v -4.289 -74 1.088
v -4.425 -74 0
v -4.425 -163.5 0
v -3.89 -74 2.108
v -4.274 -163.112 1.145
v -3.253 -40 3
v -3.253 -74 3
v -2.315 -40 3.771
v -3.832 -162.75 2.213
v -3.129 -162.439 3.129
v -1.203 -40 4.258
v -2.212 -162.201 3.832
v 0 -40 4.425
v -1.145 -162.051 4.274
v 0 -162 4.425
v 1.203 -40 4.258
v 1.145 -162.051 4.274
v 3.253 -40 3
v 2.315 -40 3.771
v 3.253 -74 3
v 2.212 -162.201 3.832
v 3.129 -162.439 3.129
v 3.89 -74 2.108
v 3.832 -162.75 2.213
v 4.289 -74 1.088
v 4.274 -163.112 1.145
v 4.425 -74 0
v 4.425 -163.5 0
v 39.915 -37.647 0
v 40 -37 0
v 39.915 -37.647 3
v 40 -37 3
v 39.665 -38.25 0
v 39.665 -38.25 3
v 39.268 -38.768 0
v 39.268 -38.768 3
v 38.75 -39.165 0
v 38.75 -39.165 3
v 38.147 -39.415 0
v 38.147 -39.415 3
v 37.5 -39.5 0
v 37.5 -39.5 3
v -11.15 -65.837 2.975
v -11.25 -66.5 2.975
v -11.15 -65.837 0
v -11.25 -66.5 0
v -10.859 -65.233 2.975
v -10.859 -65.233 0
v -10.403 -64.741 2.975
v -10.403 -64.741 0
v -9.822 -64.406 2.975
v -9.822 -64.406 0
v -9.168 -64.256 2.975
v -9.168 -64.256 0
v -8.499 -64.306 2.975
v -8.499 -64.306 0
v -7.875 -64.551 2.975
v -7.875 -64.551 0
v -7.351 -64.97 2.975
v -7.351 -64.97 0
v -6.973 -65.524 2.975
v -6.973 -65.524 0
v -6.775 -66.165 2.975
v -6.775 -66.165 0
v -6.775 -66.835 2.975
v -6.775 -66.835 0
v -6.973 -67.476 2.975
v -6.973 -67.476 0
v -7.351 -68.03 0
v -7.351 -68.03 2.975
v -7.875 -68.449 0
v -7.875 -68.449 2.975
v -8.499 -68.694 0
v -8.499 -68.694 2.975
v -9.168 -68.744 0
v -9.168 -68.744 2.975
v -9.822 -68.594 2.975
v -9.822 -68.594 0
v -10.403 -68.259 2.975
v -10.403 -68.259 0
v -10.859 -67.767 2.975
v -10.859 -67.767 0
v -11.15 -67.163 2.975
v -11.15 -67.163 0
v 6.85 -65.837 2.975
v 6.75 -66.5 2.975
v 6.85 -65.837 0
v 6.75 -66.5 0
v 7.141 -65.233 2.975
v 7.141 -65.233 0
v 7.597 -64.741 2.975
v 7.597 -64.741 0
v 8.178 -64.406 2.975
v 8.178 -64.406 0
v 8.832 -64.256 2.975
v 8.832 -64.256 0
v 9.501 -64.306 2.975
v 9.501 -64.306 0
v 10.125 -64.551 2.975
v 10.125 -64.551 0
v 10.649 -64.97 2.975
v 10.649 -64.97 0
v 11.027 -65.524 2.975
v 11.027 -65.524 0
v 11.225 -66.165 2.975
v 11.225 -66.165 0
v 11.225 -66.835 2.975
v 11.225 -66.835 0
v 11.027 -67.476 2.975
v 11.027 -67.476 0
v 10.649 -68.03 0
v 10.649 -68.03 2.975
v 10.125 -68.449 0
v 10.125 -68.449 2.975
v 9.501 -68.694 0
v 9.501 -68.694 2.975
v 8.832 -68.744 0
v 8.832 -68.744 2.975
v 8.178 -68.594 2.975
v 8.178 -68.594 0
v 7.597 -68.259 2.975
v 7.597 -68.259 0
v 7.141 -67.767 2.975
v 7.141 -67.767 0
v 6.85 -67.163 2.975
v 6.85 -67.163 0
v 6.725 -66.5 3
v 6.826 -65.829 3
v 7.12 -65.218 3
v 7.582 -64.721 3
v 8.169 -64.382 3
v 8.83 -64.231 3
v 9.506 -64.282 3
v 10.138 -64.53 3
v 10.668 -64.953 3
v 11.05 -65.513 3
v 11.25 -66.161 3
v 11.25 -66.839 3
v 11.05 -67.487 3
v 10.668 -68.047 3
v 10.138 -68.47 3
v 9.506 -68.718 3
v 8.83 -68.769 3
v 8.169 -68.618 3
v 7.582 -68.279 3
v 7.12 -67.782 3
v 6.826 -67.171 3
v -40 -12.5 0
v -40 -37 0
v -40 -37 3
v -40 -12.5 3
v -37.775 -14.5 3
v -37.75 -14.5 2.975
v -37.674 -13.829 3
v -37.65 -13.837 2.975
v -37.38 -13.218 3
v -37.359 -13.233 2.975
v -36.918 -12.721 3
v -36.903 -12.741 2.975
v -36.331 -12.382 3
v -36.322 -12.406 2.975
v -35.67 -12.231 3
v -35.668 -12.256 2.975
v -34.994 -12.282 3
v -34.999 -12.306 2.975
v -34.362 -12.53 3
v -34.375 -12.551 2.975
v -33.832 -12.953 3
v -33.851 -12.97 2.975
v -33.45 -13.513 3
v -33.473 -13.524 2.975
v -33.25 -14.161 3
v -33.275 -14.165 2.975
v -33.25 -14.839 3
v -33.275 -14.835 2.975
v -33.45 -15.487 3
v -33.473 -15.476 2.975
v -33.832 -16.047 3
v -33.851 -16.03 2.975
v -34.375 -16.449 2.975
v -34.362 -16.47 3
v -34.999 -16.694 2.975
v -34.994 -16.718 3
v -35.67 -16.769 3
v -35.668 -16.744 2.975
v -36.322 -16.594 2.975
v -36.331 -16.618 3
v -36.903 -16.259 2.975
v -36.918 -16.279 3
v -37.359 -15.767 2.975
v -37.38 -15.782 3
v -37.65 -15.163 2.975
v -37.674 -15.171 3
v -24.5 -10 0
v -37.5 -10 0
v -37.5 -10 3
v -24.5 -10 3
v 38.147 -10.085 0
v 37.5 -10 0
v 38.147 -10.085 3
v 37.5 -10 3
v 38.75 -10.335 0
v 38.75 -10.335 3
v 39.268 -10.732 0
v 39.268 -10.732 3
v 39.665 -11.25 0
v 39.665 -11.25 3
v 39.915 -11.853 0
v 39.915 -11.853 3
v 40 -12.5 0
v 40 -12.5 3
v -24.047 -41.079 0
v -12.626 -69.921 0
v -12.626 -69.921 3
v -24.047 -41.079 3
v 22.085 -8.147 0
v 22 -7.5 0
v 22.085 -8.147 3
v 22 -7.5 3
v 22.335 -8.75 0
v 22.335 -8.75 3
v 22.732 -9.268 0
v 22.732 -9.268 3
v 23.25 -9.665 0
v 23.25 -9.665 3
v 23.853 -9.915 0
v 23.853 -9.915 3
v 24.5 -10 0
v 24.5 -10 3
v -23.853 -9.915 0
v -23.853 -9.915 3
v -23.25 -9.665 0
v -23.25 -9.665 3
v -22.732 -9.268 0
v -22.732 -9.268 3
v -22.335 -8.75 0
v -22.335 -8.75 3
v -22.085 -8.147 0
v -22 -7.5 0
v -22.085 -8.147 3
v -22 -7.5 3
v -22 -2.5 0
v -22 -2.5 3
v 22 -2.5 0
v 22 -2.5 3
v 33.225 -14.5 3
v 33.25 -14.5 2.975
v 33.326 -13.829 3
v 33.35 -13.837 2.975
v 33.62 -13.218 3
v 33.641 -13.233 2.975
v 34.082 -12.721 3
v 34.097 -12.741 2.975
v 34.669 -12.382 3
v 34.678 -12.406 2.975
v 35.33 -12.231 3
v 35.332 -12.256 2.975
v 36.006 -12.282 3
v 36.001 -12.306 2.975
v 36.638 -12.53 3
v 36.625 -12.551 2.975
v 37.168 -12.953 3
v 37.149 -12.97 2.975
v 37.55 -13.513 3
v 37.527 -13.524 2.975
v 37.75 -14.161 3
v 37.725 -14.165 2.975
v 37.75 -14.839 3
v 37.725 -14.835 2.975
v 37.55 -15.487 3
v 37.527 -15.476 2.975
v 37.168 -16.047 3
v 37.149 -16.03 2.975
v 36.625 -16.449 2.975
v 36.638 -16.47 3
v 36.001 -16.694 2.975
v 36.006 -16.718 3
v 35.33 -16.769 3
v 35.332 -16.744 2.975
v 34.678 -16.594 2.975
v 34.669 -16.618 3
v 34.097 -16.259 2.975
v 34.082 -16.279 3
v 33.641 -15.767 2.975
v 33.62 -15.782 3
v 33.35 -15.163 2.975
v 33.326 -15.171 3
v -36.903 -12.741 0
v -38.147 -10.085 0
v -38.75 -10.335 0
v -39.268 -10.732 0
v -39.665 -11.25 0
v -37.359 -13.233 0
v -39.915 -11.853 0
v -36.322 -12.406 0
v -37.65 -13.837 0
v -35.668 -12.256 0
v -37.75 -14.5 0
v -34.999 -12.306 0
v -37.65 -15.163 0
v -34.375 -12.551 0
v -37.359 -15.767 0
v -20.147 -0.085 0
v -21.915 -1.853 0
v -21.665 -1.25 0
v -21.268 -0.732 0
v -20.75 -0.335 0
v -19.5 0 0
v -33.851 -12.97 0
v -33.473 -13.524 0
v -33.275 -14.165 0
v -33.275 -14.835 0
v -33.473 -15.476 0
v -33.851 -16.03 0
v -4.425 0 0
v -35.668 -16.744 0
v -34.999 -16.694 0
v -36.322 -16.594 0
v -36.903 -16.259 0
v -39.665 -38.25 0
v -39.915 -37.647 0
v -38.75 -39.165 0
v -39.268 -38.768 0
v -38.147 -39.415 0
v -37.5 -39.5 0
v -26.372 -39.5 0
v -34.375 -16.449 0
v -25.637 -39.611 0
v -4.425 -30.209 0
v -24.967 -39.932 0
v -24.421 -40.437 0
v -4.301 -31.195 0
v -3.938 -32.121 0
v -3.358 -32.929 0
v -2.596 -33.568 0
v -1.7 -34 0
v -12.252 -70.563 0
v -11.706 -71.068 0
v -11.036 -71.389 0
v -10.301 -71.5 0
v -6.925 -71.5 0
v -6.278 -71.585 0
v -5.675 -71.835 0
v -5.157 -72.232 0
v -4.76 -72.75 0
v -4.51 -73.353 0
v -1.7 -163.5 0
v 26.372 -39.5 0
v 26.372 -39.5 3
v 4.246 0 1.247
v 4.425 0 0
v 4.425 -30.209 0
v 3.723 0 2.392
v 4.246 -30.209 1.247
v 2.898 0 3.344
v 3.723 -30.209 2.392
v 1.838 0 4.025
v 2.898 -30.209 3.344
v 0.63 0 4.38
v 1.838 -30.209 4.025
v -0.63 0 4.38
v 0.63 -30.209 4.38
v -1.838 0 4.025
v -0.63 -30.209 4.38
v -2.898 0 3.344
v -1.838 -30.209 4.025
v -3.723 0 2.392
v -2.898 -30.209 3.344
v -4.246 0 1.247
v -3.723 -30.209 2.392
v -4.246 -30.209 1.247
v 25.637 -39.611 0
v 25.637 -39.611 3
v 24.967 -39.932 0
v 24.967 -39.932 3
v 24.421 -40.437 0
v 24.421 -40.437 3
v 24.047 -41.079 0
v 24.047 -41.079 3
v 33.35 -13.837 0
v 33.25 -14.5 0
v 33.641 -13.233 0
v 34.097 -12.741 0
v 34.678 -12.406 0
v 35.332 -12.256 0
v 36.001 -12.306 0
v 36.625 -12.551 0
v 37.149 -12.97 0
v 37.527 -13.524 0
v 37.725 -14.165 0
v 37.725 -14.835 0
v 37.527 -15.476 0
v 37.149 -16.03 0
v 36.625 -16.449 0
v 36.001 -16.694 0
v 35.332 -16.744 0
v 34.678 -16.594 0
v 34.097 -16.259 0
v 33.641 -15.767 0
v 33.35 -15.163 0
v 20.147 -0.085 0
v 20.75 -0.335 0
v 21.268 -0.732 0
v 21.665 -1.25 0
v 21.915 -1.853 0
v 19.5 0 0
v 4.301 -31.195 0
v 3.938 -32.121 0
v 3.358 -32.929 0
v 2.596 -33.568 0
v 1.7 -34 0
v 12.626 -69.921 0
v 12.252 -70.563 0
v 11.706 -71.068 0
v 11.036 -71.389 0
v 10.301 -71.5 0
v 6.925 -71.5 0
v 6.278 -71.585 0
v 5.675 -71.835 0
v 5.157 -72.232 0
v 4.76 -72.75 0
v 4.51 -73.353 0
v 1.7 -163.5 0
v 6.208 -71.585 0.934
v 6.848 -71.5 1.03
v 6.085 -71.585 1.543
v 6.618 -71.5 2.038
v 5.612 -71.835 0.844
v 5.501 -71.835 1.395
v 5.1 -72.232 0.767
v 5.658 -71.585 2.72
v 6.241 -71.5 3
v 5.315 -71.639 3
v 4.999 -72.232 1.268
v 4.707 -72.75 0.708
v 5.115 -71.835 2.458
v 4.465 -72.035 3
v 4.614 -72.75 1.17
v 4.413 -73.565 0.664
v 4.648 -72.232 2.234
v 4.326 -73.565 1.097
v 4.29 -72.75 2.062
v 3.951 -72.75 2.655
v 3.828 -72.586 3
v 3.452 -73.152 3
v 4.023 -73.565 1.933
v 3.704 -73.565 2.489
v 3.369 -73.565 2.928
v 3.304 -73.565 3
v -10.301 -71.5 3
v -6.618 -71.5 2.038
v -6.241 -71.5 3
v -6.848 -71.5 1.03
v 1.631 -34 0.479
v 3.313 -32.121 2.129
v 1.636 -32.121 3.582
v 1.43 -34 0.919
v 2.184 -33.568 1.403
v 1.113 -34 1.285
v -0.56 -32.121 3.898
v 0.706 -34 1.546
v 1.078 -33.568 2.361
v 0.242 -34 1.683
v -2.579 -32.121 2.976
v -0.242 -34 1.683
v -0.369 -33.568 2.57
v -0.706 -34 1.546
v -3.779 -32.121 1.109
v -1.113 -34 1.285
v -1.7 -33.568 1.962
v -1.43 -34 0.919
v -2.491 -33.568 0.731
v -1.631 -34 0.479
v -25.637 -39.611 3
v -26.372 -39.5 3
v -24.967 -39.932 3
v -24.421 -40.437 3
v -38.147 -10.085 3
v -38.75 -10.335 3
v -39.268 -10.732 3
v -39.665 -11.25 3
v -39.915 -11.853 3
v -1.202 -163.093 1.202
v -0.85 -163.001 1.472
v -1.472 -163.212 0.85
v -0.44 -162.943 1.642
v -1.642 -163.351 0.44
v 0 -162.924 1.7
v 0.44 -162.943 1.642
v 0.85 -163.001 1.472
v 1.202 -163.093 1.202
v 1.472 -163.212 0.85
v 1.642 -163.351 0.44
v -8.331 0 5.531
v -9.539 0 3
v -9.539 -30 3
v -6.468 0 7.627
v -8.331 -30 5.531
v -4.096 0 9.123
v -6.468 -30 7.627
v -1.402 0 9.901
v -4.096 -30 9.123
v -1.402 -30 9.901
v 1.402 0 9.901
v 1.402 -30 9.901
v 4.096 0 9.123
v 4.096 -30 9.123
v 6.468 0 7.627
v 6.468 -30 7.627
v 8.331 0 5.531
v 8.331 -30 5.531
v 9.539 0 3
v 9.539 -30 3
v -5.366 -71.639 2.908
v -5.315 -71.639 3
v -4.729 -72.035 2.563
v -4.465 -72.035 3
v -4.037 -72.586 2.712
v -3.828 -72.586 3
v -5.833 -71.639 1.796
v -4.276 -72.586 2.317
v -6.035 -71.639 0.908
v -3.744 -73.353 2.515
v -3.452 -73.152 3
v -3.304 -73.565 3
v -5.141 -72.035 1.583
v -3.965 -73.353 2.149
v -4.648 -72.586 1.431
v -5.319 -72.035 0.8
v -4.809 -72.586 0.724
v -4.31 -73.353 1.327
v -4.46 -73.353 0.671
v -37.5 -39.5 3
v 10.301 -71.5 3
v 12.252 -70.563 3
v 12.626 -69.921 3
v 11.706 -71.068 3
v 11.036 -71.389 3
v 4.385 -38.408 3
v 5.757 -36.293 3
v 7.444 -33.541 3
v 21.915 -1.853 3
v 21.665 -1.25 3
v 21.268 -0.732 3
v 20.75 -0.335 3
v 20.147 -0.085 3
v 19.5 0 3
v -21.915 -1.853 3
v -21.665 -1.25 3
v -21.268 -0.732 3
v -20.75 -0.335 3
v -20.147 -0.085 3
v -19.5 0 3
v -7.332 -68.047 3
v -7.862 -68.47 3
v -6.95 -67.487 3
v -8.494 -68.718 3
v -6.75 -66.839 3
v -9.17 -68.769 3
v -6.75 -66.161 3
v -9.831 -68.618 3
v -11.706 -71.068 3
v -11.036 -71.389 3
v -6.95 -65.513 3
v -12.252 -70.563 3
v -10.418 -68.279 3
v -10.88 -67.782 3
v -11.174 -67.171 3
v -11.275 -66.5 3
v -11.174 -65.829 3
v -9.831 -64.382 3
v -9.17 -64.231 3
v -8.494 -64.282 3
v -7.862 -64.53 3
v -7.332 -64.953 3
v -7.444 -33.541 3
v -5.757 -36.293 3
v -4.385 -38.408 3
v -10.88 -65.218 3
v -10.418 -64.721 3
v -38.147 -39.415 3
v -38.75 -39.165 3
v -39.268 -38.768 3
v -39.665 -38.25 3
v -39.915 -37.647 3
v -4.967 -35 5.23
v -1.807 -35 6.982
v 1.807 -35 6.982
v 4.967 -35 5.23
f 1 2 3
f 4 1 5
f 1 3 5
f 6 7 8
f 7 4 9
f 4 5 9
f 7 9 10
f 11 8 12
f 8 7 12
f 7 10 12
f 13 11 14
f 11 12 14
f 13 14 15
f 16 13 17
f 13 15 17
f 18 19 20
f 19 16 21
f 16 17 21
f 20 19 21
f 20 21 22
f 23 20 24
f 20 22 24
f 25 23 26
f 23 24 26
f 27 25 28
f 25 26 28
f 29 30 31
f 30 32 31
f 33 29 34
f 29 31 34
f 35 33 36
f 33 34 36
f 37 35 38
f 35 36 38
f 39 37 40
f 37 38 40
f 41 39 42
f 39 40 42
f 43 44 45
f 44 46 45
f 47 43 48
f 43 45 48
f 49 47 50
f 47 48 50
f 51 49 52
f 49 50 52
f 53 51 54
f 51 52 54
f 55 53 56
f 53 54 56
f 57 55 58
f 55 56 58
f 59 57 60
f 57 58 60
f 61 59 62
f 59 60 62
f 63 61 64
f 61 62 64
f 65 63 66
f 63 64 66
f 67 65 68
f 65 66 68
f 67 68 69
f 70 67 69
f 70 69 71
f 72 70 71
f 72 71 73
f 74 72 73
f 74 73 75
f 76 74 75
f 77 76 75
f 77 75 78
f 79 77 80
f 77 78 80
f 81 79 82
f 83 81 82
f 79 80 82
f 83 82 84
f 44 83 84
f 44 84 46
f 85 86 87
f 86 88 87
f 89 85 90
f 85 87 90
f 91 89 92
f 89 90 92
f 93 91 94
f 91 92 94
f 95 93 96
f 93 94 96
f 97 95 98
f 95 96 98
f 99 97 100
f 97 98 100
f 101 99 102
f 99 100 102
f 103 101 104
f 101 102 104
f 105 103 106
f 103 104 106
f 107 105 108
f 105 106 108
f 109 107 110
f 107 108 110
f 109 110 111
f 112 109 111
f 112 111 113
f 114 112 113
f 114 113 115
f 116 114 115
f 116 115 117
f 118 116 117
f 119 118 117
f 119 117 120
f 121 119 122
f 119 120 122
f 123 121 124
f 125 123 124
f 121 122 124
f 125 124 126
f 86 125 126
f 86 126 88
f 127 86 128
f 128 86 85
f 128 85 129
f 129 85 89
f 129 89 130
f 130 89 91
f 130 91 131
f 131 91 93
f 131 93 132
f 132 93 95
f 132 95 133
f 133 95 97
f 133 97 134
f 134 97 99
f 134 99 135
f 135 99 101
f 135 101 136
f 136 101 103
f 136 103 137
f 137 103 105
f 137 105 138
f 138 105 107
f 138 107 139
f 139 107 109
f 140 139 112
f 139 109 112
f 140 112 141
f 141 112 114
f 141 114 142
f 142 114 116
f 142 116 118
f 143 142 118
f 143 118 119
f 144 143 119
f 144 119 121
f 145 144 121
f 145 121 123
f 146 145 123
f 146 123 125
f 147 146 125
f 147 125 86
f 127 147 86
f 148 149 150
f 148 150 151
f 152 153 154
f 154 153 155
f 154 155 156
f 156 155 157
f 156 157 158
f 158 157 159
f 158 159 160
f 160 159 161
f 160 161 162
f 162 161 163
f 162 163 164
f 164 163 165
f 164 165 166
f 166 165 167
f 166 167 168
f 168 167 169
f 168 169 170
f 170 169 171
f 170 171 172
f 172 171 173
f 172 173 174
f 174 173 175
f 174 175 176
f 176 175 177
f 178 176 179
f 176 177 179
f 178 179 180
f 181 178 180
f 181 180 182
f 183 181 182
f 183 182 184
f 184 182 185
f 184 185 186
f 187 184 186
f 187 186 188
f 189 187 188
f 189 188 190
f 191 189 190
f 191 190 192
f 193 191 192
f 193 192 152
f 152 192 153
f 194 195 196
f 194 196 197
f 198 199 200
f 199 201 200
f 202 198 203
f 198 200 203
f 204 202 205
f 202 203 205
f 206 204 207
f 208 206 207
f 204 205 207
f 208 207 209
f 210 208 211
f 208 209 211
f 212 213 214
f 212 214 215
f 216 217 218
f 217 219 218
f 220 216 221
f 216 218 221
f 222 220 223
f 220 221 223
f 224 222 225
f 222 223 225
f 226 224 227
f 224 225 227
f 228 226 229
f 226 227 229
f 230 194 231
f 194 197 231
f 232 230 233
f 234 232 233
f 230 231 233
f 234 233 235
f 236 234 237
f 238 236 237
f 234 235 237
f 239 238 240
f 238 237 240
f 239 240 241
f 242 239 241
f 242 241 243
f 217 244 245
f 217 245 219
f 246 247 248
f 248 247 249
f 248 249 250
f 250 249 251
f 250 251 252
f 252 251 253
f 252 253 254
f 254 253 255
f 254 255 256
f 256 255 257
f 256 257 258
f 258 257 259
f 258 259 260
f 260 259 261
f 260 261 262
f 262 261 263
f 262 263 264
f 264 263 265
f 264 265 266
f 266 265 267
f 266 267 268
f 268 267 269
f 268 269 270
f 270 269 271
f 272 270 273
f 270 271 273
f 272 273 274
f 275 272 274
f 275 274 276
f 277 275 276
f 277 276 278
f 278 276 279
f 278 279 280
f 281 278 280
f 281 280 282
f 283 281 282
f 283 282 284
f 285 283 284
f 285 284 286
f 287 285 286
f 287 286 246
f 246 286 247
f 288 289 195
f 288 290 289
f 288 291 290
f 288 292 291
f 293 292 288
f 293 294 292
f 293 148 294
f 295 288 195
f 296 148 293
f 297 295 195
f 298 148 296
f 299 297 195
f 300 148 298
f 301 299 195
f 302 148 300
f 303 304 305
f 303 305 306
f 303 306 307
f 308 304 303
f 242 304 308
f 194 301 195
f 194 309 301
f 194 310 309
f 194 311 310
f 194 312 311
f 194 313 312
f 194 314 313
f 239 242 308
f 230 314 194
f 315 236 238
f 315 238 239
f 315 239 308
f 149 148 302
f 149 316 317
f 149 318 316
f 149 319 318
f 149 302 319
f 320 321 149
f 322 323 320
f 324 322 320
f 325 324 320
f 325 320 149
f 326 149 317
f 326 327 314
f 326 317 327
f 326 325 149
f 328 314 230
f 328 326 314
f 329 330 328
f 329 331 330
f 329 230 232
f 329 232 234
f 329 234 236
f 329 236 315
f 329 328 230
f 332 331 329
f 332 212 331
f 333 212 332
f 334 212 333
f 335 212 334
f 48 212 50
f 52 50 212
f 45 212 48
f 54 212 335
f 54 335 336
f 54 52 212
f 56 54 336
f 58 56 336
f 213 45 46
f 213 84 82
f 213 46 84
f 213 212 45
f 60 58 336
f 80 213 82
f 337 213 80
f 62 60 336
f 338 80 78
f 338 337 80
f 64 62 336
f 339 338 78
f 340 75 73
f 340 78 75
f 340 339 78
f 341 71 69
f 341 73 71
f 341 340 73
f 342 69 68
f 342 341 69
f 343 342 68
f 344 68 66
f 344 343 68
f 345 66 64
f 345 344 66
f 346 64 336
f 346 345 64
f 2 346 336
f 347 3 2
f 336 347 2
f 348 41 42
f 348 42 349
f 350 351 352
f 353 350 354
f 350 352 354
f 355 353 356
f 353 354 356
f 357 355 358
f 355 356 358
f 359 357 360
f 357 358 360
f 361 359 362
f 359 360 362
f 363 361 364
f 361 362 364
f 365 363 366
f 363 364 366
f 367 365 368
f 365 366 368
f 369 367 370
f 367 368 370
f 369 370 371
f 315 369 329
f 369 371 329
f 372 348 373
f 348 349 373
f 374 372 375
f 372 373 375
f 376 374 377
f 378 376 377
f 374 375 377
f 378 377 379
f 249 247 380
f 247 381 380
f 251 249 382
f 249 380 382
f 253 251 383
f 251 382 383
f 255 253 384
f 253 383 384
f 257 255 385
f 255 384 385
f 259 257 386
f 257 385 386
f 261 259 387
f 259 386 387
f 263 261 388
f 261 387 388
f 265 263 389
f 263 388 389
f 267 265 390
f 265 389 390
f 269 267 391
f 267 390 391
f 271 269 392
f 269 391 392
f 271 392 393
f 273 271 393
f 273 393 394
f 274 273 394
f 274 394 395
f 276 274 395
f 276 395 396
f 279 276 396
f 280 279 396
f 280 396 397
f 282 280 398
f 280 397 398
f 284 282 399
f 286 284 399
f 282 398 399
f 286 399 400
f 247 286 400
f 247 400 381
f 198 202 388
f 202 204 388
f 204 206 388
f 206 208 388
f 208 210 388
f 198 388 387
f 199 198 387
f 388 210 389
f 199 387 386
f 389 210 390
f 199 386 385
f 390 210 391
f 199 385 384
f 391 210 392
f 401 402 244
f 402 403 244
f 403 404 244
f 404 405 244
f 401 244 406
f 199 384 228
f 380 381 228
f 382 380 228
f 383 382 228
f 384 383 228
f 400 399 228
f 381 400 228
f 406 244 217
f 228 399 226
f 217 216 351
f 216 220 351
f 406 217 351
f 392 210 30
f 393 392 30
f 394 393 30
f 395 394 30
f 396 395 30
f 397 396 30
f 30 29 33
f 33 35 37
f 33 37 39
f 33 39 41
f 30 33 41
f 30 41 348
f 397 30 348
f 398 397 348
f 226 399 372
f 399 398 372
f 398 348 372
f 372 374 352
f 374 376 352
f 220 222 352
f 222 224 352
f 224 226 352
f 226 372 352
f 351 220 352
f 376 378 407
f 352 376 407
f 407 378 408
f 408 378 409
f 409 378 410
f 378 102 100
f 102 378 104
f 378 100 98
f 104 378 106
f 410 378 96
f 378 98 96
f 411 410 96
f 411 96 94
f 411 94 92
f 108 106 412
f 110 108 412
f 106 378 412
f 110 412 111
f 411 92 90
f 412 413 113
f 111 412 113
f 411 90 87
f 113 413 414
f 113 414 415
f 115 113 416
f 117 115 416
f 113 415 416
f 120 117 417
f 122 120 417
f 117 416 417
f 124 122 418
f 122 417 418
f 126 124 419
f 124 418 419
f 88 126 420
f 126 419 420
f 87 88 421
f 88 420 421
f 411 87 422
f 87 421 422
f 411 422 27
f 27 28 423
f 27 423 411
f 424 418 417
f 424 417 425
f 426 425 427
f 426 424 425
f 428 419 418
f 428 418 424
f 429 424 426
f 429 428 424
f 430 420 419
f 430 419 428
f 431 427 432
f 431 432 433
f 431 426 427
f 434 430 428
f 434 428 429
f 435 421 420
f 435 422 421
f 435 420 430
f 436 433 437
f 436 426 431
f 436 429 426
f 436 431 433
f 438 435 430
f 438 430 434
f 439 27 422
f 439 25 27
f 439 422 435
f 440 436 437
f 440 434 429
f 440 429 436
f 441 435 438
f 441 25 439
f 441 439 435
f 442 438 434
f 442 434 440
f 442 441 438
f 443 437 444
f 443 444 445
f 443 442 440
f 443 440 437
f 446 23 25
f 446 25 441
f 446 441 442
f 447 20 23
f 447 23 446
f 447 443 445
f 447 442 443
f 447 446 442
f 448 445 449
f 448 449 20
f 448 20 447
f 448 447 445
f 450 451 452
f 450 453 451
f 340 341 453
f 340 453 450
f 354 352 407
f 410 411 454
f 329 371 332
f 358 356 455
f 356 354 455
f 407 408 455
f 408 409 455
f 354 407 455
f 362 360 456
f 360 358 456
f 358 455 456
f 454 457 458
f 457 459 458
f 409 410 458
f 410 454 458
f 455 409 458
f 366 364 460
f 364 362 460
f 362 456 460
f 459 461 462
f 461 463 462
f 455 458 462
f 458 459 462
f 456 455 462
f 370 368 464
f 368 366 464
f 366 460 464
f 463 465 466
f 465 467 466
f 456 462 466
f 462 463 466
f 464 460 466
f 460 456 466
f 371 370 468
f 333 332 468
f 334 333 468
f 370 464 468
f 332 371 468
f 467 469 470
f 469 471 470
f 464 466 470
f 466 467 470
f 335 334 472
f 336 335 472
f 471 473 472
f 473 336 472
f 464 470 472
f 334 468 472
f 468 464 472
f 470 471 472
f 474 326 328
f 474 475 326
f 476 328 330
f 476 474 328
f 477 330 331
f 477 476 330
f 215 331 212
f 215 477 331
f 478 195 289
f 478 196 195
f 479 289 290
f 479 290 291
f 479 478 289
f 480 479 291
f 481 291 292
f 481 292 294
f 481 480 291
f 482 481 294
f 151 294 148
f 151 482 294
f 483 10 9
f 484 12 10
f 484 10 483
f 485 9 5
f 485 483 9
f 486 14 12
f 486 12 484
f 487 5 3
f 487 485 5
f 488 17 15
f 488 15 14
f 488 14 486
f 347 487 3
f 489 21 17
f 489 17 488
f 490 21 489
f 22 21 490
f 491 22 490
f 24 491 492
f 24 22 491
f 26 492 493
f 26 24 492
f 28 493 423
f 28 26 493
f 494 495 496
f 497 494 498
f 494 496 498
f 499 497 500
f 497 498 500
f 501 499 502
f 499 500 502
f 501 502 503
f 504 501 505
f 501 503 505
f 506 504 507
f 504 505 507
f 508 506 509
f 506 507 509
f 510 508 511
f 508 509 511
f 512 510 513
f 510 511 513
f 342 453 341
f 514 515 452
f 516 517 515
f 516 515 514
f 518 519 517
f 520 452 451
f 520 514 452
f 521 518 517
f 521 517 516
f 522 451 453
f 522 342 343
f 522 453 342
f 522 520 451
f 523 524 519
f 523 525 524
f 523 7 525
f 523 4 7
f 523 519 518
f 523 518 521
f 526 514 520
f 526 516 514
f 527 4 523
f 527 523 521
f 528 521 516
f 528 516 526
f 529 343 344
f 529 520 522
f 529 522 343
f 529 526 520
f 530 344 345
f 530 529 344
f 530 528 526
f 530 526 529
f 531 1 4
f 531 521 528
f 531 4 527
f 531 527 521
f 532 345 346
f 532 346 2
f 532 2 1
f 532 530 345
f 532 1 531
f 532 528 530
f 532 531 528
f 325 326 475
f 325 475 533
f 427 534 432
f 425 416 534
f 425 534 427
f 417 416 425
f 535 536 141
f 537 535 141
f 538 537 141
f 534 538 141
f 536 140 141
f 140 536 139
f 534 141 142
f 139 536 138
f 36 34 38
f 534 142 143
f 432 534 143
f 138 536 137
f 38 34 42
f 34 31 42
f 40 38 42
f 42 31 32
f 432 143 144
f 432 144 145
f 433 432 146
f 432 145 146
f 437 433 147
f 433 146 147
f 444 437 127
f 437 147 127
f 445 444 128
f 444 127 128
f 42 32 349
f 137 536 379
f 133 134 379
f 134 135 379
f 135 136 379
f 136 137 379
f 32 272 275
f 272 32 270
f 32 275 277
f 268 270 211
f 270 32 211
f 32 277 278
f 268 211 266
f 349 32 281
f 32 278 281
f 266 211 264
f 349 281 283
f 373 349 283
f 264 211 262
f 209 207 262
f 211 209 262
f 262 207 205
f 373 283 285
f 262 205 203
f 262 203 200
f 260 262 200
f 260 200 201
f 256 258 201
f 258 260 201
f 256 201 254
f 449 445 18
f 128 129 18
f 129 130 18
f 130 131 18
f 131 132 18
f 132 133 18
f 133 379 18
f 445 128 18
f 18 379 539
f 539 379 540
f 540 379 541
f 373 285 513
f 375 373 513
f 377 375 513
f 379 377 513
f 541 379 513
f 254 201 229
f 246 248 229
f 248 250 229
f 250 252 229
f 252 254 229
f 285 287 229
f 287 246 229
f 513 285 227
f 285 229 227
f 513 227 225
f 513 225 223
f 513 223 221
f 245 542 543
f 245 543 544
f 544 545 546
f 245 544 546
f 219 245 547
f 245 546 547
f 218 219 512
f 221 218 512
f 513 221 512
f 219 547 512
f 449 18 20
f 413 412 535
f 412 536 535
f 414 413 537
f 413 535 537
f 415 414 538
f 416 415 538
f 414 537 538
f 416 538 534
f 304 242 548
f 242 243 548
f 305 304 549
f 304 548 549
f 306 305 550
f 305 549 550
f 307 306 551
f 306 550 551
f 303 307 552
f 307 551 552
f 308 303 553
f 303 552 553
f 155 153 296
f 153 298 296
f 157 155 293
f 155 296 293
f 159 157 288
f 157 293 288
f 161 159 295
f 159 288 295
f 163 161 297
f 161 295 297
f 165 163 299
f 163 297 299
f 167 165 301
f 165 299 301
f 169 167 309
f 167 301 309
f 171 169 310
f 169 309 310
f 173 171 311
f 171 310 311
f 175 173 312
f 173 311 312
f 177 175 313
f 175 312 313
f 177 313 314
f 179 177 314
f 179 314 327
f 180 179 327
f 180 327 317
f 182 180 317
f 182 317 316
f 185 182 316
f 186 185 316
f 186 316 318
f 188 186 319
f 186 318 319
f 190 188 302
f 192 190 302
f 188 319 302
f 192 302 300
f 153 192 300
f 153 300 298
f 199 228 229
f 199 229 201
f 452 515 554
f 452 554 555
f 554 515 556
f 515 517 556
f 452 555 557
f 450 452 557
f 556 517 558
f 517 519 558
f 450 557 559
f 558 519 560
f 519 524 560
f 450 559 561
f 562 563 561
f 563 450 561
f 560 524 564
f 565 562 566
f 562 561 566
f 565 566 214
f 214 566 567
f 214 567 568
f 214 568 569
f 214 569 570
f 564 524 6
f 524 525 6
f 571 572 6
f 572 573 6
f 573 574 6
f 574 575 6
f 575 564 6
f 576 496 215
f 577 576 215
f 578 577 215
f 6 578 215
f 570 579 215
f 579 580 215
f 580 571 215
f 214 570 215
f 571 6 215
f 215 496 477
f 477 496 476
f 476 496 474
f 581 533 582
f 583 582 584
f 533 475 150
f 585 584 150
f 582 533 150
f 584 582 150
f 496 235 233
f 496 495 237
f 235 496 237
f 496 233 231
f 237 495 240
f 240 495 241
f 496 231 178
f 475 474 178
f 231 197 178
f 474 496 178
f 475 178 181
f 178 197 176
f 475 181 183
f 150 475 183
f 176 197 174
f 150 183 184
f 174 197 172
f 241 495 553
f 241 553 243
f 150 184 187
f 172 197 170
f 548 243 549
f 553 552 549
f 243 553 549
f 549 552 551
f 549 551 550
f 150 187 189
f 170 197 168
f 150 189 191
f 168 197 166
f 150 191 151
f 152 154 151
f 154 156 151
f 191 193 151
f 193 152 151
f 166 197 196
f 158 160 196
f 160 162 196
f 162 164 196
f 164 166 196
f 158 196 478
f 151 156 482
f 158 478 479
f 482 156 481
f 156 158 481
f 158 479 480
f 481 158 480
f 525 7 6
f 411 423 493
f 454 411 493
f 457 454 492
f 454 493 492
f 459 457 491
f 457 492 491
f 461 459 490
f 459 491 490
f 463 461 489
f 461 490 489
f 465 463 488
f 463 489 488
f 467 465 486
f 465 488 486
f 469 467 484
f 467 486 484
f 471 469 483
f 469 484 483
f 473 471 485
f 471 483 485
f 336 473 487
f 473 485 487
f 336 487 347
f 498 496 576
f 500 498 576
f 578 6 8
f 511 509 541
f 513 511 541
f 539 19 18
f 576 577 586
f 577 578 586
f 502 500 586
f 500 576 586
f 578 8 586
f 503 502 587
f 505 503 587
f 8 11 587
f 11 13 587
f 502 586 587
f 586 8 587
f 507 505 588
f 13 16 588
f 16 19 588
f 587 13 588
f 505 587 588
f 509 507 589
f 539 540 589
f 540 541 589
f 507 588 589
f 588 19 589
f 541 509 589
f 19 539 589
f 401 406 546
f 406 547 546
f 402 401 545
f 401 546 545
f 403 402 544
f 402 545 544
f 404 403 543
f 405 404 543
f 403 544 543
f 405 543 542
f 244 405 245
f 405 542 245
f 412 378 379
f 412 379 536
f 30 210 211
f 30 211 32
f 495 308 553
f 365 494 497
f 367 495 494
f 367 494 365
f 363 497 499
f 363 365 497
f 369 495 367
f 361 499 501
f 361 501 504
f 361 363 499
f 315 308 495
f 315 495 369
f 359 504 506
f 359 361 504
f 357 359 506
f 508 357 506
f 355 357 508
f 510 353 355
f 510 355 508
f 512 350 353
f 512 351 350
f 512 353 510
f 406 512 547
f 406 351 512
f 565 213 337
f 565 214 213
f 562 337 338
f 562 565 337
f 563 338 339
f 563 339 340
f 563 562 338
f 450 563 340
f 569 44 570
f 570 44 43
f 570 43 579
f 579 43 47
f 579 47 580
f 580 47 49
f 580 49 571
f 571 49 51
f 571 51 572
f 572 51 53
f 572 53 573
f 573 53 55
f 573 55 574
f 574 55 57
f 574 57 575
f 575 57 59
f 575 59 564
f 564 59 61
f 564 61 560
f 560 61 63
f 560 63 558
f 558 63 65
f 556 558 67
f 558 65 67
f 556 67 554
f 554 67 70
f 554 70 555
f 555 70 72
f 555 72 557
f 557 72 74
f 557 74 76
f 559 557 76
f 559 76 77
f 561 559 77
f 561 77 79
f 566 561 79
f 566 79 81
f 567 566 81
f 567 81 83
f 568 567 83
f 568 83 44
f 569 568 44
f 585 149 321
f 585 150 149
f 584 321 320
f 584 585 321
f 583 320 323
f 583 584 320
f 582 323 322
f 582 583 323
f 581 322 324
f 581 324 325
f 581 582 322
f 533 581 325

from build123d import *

# Parameters (mm, degrees)
BOSS_EXTRUDE1_DEPTH            = 3
SKETCH2_W                      = 2.725
SKETCH2_H                      = 93.5
REVOLVE1_ANGLE                 = 180
SKETCH2_3_W                    = 1.7
SKETCH2_3_H                    = 93.5
M4_CLEARANCE_HOLE1_D           = 4.5
M4_CLEARANCE_HOLE1_CSINK_D     = 4.55
M4_CLEARANCE_HOLE1_CSINK_ANGLE = 90
FILLET1_R                      = 4
FILLET2_R                      = 2.5
CUT_EXTRUDE2_DEPTH             = 5


with BuildPart() as part:
    # Sketch1 → Boss-Extrude1 (new body)
    with BuildSketch(Plane.XY):
        Polygon((-22, 0), (22, 0), (22, -10), (40, -10), (40, -39.5), (24.672961021, -39.5), (12, -71.5), (-12, -71.5), (-24.672961021, -39.5), (-40, -39.5), (-40, -10), (-22, -10), align=None)
    extrude(amount=BOSS_EXTRUDE1_DEPTH)

    # Sketch2 → Revolve1 (revolve)
    with BuildSketch(Plane.XY):
        with Locations((-3.0625, -118.25)):
            Rectangle(SKETCH2_W, SKETCH2_H)
        Polygon((-4.425, -40), (-4.425, -71.5), (-1.7, -71.5), (-1.7, -34), (-4.425, -34), (-4.425, 0), (-10, 0), (-10, -30), align=None)
    revolve(axis=Axis((0, 0, 0), (0, 1, 0)), revolution_arc=REVOLVE1_ANGLE)

    # Sketch2<3> → Cut-Revolve1 (revolve, cut)
    with BuildSketch(Plane.XY):
        with Locations((-0.85, -118.25)):
            Rectangle(SKETCH2_3_W, SKETCH2_3_H)
        Polygon((-1.7, -34), (-1.7, -71.5), (0, -71.5), (0, 0), (-4.425, 0), (-4.425, -34), align=None)
    revolve(axis=Axis((0, 0, 0), (0, -1, 0)), mode=Mode.SUBTRACT)

    # M4 Clearance Hole1 (through all)
    with Locations(Plane.XY.offset(3)):
        with Locations((-35.5, -14.5), (-9, -66.5), (9, -66.5), (35.5, -14.5)):
            CounterSinkHole(M4_CLEARANCE_HOLE1_D / 2, M4_CLEARANCE_HOLE1_CSINK_D / 2, counter_sink_angle=M4_CLEARANCE_HOLE1_CSINK_ANGLE)

    # Fillet1
    # the kernel refuses this fillet: 4 mm, written as the material it adds along each edge
    with BuildSketch(Plane(origin=(0, -34, 0), x_dir=(1, 0, 0), z_dir=(0, 0, -1))) as fillet1_piece_1:
        with BuildLine():
            CenterArc((0.425, -3.791355299), FILLET1_R, 0, 71.412652979)
            Line((1.7, 0), (1.7255, 0.075827106))
            ThreePointArc((1.7255, 0.075827106), (3.0625, 0.08), (4.425, 0.08))
            Line((4.425, 0.08), (4.505, 0))
            Line((4.505, 0), (4.505, -3.791355299))
            Line((4.505, -3.791355299), (4.425, -3.791355299))
        make_face()
    revolve(axis=Axis((0, -34, 0), (0, -1, 0)), revolution_arc=180)

    # Fillet2
    fillet2_edges = [part.edges().sort_by_distance(p)[0] for p in [
        (-22, 0, 1.5),
        (22, 0, 1.5),
        (22, -10, 1.5),
        (40, -10, 1.5),
        (40, -39.5, 1.5),
        (24.672961021, -39.5, 1.5),
        (12, -71.5, 1.5),
        (-12, -71.5, 1.5),
        (-24.672961021, -39.5, 1.5),
        (-40, -39.5, 1.5),
        (-40, -10, 1.5),
        (-22, -10, 1.5),
        (4.121541499, -71.5, 1.610441142),
        (-4.121541499, -71.5, 1.610441142),
    ]]
    fillet(fillet2_edges, radius=FILLET2_R)

    # Sketch9 → Cut-Extrude2 (cut, symmetric)
    with BuildSketch(Plane(origin=(0, 0, 0), x_dir=(0, 0, -1), z_dir=(1, 0, 0))):
        Polygon((-4.425, -162), (4.425, -165), (-4.425, -165), align=None)
    extrude(amount=CUT_EXTRUDE2_DEPTH, both=True, mode=Mode.SUBTRACT)


solid = part.part
